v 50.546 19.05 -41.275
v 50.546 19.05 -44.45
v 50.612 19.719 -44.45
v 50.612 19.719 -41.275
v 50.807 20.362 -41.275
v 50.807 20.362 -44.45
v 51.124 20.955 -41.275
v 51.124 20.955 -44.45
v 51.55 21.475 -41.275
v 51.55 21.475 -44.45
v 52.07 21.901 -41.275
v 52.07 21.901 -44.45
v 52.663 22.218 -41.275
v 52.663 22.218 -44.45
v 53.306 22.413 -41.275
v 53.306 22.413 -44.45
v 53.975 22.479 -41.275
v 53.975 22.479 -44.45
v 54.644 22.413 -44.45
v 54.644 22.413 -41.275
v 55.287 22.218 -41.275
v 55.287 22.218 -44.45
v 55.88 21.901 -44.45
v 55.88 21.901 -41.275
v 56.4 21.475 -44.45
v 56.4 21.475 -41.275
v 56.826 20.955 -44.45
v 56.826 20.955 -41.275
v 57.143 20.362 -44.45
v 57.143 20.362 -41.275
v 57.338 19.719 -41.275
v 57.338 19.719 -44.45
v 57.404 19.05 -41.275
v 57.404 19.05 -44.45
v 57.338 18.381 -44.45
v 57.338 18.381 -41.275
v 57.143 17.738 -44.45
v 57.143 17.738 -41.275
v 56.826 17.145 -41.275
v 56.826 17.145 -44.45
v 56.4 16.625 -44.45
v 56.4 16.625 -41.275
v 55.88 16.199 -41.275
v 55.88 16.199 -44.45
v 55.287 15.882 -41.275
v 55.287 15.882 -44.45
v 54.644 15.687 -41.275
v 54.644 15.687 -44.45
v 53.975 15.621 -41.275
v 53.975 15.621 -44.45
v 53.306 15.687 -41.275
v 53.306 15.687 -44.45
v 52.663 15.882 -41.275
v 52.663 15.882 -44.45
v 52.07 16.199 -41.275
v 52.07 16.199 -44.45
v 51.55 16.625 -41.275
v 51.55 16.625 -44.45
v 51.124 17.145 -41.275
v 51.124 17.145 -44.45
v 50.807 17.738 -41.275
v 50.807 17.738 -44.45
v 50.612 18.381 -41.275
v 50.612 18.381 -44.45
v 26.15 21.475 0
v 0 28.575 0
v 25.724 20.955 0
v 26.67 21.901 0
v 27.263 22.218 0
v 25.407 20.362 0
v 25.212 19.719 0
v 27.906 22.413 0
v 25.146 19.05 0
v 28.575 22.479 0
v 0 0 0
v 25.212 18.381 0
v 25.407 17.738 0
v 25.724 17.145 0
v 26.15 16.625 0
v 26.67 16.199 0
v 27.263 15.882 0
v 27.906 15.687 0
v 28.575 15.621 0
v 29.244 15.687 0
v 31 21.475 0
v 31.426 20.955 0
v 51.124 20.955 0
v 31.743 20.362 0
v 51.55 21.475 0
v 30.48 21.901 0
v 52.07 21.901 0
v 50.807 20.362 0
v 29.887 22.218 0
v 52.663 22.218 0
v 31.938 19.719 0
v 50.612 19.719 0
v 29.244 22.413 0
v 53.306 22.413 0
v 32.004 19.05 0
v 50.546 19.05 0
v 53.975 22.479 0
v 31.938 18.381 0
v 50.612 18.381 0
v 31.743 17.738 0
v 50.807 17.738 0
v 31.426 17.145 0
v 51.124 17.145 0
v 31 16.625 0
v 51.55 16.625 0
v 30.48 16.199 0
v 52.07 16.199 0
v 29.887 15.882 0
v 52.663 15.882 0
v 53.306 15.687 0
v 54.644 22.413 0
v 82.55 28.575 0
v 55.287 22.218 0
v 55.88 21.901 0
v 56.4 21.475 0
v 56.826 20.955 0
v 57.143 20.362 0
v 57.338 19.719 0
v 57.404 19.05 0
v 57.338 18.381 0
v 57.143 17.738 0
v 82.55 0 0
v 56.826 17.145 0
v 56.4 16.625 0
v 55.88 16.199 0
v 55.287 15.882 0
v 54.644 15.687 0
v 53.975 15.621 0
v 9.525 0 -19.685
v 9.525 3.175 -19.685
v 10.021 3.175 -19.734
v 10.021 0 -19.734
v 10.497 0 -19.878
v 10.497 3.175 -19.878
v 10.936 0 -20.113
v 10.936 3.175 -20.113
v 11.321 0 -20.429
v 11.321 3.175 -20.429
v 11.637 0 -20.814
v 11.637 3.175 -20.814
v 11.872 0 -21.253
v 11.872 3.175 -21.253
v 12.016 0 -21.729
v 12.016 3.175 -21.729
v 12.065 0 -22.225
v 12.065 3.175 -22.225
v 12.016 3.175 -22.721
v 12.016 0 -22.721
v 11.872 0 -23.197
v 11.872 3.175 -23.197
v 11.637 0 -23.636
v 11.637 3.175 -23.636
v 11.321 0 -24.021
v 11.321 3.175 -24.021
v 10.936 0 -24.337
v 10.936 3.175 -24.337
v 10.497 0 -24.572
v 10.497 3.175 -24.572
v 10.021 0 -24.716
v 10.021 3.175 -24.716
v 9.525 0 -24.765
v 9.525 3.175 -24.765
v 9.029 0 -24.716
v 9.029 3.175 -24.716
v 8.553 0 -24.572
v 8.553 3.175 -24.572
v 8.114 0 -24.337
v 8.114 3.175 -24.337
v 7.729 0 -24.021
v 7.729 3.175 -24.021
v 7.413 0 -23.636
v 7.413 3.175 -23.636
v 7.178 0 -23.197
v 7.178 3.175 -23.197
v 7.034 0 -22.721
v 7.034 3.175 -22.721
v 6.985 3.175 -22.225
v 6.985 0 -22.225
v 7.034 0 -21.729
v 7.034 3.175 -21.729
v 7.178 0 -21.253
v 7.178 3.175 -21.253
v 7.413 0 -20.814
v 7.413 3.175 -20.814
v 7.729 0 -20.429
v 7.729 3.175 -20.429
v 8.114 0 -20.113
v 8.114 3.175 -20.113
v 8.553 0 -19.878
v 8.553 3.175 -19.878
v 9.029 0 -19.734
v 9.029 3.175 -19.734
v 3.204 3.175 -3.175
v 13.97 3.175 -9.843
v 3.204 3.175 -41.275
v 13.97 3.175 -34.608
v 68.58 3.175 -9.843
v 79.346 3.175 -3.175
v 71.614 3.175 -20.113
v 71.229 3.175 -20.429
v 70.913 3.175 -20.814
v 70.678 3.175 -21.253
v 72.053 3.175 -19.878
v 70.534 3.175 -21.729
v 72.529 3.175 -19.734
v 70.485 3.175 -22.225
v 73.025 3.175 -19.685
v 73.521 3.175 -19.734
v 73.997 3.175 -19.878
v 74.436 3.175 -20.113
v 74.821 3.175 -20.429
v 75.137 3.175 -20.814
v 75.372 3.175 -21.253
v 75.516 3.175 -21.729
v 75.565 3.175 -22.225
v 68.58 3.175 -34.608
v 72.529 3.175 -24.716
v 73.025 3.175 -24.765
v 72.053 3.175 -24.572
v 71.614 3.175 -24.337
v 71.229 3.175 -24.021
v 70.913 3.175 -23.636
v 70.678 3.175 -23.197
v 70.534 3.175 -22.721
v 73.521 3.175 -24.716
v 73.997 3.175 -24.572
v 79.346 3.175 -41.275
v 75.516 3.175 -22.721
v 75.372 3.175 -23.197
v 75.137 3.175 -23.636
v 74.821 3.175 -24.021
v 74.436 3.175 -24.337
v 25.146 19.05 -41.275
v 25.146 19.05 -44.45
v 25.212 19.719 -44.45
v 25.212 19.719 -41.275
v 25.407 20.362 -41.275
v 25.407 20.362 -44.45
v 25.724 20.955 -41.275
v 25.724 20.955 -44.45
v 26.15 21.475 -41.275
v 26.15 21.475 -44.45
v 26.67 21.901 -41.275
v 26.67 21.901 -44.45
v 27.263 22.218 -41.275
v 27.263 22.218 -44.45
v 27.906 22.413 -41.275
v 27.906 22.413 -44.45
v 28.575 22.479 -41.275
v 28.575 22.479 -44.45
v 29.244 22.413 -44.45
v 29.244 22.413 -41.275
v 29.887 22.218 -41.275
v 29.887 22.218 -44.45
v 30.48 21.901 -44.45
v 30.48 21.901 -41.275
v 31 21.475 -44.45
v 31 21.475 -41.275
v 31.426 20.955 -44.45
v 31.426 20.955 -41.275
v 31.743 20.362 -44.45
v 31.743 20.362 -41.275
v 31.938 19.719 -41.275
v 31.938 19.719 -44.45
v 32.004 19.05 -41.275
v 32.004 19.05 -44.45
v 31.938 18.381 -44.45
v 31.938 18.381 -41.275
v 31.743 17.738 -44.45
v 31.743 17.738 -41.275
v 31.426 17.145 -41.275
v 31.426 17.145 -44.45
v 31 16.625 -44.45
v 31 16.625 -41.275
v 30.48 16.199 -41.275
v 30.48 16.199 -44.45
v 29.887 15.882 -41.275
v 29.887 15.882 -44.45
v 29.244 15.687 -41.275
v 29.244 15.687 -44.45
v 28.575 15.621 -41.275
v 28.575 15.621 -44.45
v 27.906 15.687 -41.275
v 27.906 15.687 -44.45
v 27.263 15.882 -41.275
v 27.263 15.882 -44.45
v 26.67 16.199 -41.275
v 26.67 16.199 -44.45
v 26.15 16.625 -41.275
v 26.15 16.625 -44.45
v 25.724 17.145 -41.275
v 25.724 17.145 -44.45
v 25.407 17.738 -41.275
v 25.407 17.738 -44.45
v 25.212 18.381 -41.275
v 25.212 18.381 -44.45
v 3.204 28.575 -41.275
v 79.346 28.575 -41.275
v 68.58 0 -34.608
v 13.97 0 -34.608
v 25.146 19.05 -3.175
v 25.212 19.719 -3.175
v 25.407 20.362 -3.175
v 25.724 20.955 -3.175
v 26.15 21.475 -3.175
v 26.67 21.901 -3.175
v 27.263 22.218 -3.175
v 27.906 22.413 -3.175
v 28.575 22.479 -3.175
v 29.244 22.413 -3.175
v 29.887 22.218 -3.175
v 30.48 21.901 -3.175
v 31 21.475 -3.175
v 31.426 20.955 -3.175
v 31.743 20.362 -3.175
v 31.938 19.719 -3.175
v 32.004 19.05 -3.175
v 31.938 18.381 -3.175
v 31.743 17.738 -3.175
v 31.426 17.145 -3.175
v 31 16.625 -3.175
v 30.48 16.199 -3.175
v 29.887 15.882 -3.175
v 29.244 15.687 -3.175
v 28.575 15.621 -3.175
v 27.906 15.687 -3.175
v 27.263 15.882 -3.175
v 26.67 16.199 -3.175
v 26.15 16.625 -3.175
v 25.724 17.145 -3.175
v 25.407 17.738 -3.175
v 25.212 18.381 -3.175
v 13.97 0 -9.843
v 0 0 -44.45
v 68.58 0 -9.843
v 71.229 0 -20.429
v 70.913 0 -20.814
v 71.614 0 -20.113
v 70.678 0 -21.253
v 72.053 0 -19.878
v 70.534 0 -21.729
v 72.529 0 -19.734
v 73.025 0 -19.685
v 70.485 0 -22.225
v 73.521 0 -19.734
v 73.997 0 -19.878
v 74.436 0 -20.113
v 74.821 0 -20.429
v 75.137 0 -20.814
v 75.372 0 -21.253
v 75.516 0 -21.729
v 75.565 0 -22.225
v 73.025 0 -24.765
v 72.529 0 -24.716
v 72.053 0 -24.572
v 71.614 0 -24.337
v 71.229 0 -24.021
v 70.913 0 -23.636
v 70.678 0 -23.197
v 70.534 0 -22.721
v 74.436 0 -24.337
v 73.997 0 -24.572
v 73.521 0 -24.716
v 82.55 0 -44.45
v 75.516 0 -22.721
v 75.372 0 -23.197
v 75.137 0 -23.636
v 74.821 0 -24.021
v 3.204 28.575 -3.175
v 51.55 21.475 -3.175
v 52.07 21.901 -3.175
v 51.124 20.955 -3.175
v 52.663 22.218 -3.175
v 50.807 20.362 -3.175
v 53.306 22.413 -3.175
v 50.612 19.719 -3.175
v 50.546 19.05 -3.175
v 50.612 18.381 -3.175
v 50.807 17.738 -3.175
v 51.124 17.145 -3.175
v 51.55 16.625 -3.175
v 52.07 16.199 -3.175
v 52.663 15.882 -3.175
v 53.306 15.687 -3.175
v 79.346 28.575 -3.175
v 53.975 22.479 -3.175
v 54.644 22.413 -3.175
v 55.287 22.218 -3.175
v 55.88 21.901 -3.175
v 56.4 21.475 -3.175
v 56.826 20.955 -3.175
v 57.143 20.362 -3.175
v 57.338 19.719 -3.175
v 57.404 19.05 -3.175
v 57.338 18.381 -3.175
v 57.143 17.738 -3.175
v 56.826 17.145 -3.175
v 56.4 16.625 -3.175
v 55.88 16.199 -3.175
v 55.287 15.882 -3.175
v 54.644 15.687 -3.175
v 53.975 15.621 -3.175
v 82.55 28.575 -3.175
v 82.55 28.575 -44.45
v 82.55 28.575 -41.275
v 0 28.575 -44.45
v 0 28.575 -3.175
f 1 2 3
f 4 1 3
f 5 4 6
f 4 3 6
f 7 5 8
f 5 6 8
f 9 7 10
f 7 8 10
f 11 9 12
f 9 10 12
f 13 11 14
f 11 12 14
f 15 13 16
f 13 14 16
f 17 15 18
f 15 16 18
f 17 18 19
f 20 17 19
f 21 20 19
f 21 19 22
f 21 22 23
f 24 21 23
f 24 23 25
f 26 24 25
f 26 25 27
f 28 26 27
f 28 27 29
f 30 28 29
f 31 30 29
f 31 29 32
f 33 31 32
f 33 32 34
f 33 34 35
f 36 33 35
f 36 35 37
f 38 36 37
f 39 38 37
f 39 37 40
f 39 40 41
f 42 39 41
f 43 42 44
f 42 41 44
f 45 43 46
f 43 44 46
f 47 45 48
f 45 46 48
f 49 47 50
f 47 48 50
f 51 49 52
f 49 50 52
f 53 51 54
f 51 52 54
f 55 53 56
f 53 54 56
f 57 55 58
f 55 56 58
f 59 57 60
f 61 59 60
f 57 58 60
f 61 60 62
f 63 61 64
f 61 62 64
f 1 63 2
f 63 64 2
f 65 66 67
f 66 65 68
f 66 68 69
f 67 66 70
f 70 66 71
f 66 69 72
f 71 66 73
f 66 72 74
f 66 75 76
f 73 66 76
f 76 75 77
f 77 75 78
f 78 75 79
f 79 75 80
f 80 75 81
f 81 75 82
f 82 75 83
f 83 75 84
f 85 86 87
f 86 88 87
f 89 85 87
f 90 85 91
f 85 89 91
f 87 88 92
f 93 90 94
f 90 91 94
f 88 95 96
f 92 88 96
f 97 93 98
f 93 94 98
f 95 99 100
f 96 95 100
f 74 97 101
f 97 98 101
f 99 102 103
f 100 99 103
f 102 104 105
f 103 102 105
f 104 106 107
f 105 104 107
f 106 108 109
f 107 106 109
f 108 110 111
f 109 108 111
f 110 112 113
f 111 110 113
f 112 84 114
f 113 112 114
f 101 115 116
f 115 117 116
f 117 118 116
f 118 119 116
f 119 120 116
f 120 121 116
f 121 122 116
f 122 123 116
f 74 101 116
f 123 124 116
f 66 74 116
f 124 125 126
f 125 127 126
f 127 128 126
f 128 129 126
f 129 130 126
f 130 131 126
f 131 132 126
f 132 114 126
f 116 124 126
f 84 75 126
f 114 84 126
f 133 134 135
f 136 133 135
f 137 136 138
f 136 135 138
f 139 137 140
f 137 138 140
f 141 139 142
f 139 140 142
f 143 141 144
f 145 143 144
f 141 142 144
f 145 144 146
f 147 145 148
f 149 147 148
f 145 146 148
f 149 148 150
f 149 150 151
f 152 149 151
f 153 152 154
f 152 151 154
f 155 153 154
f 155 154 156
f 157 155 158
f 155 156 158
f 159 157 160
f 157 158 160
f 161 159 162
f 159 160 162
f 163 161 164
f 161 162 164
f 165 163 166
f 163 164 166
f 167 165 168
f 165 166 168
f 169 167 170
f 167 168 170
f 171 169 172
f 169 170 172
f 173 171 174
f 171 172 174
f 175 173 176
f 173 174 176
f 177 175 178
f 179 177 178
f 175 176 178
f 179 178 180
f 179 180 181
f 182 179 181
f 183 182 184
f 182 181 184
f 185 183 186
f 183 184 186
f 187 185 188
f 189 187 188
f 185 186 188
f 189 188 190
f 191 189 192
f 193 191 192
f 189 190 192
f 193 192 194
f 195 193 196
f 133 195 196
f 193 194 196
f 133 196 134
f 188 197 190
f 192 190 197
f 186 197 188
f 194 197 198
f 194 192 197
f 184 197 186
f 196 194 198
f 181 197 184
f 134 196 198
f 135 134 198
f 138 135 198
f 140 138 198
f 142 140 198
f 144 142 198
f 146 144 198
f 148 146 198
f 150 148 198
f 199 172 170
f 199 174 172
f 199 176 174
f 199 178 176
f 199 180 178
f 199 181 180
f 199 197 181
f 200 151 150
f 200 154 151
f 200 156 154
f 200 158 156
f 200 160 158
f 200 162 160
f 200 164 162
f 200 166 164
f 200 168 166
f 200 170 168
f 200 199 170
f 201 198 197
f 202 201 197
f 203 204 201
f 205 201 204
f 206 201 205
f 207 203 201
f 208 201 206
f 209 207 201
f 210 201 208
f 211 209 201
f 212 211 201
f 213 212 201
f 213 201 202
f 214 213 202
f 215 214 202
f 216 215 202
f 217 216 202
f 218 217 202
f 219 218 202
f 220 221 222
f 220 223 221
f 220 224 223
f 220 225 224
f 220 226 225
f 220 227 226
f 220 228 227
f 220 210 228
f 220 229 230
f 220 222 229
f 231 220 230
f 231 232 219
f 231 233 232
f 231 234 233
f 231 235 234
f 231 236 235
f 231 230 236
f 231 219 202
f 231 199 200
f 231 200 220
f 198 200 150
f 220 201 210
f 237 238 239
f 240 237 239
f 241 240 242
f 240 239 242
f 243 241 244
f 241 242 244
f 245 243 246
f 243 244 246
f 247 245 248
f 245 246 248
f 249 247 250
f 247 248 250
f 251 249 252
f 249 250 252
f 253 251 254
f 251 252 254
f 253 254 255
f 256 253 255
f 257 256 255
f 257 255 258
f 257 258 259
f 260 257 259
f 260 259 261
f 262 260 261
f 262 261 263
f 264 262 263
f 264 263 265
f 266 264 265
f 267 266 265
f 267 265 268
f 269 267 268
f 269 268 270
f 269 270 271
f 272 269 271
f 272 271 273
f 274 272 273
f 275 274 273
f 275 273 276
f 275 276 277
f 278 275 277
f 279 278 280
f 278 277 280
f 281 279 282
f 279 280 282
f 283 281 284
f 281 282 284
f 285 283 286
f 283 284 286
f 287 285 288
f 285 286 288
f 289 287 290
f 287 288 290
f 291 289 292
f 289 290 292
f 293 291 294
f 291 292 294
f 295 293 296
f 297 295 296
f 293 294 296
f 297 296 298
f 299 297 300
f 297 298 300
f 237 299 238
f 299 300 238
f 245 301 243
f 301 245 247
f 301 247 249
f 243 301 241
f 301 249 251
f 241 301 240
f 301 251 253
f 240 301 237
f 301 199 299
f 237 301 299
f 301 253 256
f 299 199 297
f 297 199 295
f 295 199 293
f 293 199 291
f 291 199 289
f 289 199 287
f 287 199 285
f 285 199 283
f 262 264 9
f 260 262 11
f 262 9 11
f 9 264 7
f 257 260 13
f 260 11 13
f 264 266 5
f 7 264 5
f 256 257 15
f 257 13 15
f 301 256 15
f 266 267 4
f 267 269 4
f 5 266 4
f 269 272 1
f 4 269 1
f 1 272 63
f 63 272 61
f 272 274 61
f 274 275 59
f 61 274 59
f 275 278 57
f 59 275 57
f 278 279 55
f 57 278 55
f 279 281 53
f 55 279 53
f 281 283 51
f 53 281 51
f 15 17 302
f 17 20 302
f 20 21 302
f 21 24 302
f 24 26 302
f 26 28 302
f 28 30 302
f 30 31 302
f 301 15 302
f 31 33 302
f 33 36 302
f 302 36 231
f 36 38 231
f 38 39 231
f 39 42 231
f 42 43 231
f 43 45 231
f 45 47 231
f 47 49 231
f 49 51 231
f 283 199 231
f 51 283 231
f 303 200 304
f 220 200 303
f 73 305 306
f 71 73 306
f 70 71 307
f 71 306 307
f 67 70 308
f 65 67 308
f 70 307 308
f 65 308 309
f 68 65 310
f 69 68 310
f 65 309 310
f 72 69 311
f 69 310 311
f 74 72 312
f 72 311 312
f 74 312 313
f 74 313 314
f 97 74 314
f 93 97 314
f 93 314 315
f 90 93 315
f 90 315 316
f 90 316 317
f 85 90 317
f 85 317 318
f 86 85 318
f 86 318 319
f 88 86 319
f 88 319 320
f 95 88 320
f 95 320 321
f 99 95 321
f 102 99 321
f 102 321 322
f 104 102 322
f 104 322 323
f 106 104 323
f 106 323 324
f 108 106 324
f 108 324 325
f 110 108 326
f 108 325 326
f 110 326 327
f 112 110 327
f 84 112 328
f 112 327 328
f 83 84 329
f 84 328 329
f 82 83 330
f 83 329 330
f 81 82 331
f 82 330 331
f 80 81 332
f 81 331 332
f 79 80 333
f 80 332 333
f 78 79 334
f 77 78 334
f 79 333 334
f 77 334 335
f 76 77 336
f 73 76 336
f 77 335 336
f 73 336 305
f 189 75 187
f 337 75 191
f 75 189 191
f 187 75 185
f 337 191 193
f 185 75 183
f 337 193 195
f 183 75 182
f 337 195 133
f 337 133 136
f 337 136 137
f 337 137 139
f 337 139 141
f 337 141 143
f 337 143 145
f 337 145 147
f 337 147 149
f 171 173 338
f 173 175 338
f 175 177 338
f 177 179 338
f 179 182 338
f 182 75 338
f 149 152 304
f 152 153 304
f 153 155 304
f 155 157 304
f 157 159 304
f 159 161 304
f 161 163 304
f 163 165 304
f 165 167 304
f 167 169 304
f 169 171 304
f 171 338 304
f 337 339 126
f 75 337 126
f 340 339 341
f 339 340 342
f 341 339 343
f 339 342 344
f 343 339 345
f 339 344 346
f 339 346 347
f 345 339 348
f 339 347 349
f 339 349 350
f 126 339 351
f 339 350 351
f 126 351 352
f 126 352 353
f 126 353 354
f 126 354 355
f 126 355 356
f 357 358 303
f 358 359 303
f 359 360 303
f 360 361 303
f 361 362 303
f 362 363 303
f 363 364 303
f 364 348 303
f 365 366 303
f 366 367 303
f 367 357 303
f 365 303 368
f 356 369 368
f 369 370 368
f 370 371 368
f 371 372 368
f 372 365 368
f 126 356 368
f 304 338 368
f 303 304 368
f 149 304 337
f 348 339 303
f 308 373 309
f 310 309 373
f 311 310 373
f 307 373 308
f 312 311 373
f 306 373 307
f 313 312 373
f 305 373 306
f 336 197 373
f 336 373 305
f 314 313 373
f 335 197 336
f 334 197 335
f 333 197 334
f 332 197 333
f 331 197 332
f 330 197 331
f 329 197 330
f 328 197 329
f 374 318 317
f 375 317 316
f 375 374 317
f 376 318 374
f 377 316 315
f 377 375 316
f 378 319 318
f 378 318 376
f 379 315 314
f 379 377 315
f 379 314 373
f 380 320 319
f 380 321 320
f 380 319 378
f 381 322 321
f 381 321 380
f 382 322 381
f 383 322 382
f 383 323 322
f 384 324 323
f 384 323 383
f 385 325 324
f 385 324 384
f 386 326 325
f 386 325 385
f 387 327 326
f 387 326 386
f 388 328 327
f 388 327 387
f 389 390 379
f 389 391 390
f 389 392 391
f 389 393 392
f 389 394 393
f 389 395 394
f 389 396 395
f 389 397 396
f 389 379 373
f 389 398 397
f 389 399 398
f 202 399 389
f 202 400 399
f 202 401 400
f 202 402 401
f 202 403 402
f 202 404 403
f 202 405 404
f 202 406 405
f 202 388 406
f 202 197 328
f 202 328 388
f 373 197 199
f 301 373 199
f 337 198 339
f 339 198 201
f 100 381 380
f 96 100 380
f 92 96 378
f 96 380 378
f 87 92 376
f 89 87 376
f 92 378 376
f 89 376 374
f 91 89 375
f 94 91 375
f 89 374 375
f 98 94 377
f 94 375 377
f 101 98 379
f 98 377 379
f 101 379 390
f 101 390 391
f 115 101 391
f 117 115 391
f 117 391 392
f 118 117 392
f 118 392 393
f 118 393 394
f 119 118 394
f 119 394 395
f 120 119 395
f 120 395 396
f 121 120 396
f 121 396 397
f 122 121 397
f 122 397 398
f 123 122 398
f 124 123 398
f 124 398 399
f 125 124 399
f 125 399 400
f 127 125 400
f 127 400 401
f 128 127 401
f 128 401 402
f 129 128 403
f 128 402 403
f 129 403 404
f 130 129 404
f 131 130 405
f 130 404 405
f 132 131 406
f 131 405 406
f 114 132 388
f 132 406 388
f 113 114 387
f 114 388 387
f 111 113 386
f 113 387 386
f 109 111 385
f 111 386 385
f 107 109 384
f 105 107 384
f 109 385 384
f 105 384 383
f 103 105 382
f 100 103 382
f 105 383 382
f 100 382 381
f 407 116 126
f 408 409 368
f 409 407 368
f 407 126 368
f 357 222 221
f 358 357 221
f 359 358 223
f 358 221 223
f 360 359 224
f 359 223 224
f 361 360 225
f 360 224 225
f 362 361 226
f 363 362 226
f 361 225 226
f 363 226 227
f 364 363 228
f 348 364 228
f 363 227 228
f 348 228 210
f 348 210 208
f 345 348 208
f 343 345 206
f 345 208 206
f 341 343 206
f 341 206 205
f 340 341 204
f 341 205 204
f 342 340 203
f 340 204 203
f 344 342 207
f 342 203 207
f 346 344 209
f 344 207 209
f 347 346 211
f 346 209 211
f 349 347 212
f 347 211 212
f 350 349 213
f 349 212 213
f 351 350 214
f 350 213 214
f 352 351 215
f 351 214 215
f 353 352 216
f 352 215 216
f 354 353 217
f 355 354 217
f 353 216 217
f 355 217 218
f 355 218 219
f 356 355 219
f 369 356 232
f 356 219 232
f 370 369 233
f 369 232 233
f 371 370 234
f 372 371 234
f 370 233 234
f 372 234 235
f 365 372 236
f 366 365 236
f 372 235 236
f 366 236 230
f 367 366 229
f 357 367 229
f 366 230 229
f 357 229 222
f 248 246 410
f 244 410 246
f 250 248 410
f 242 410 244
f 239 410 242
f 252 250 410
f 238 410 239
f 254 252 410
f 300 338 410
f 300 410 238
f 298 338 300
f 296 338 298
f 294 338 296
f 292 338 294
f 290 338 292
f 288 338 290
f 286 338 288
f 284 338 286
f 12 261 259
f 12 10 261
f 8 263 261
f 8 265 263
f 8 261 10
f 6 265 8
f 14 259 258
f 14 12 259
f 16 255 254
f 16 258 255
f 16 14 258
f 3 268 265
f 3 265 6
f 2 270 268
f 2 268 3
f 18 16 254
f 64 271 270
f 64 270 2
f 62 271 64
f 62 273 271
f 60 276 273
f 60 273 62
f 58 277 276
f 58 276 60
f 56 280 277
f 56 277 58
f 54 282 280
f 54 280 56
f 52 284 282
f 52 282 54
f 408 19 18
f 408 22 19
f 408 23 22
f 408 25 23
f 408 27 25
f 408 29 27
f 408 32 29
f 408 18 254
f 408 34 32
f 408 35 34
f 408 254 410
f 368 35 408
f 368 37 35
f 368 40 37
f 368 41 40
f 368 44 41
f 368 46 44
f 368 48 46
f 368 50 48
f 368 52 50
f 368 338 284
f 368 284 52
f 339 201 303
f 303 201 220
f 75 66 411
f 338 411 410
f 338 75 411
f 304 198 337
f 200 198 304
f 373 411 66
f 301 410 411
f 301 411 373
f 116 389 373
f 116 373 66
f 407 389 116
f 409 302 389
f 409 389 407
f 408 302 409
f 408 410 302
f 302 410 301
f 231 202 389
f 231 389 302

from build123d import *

# Parameters (mm, degrees)
SKETCH1_W           = 82.55
SKETCH1_H           = 44.45
BOSS_EXTRUDE1_DEPTH = 3.175
SKETCH2_R           = 2.54
CUT_EXTRUDE1_DEPTH  = 3.175
SKETCH4_W           = 54.61
SKETCH4_H           = 24.765
CUT_EXTRUDE2_DEPTH  = 3.175
SKETCH5_W           = 82.55
SKETCH5_H           = 3.175
BOSS_EXTRUDE2_DEPTH = 25.4
SKETCH7_W           = 3.204255847
SKETCH7_H           = 38.1
BOSS_EXTRUDE3_DEPTH = 25.4
SKETCH6_R           = 3.429
CUT_EXTRUDE3_DEPTH  = 99.014466407


with BuildPart() as part:
    # Sketch1 → Boss-Extrude1 (new body)
    with BuildSketch(Plane(origin=(0, 0, 0), x_dir=(1, 0, 0), z_dir=(0, 1, 0))):
        with Locations((41.275, 22.225)):
            Rectangle(SKETCH1_W, SKETCH1_H)
    extrude(amount=BOSS_EXTRUDE1_DEPTH)

    # Sketch2 → Cut-Extrude1 (cut)
    with BuildSketch(Plane(origin=(0, 3.175, 0), x_dir=(1, 0, 0), z_dir=(0, 1, 0))):
        with Locations(Location((9.525, 22.225, 0), (0, 0, 270))):
            Circle(SKETCH2_R)
        with Locations(Location((73.025, 22.225, 0), (0, 0, 90))):
            Circle(SKETCH2_R)
    extrude(amount=-CUT_EXTRUDE1_DEPTH, mode=Mode.SUBTRACT)

    # Sketch4 → Cut-Extrude2 (cut)
    with BuildSketch(Plane(origin=(0, 3.175, 0), x_dir=(1, 0, 0), z_dir=(0, 1, 0))):
        with Locations((41.275, 22.225)):
            Rectangle(SKETCH4_W, SKETCH4_H)
    extrude(amount=-CUT_EXTRUDE2_DEPTH, mode=Mode.SUBTRACT)

    # Sketch5 → Boss-Extrude2 (add)
    with BuildSketch(Plane(origin=(0, 3.175, 0), x_dir=(1, 0, 0), z_dir=(0, 1, 0))):
        with Locations((41.275, 42.8625)):
            Rectangle(SKETCH5_W, SKETCH5_H)
        with Locations((41.275, 1.5875)):
            Rectangle(SKETCH5_W, SKETCH5_H)
    extrude(amount=BOSS_EXTRUDE2_DEPTH)

    # Sketch7 → Boss-Extrude3 (add)
    with BuildSketch(Plane(origin=(0, 3.175, 0), x_dir=(1, 0, 0), z_dir=(0, 1, 0))):
        with Locations((1.602127924, 22.225)):
            Rectangle(SKETCH7_W, SKETCH7_H)
        with Locations((80.947872077, 22.225)):
            Rectangle(SKETCH7_W, SKETCH7_H)
    extrude(amount=BOSS_EXTRUDE3_DEPTH)

    # Sketch6 → Cut-Extrude3 (cut, through all)
    with BuildSketch(Plane(origin=(0, 0, -44.45), x_dir=(-1, 0, 0), z_dir=(0, 0, -1))):
        with Locations((-28.575, 19.05)):
            Circle(SKETCH6_R)
        with Locations((-53.975, 19.05)):
            Circle(SKETCH6_R)
    extrude(amount=-CUT_EXTRUDE3_DEPTH, mode=Mode.SUBTRACT)


solid = part.part
